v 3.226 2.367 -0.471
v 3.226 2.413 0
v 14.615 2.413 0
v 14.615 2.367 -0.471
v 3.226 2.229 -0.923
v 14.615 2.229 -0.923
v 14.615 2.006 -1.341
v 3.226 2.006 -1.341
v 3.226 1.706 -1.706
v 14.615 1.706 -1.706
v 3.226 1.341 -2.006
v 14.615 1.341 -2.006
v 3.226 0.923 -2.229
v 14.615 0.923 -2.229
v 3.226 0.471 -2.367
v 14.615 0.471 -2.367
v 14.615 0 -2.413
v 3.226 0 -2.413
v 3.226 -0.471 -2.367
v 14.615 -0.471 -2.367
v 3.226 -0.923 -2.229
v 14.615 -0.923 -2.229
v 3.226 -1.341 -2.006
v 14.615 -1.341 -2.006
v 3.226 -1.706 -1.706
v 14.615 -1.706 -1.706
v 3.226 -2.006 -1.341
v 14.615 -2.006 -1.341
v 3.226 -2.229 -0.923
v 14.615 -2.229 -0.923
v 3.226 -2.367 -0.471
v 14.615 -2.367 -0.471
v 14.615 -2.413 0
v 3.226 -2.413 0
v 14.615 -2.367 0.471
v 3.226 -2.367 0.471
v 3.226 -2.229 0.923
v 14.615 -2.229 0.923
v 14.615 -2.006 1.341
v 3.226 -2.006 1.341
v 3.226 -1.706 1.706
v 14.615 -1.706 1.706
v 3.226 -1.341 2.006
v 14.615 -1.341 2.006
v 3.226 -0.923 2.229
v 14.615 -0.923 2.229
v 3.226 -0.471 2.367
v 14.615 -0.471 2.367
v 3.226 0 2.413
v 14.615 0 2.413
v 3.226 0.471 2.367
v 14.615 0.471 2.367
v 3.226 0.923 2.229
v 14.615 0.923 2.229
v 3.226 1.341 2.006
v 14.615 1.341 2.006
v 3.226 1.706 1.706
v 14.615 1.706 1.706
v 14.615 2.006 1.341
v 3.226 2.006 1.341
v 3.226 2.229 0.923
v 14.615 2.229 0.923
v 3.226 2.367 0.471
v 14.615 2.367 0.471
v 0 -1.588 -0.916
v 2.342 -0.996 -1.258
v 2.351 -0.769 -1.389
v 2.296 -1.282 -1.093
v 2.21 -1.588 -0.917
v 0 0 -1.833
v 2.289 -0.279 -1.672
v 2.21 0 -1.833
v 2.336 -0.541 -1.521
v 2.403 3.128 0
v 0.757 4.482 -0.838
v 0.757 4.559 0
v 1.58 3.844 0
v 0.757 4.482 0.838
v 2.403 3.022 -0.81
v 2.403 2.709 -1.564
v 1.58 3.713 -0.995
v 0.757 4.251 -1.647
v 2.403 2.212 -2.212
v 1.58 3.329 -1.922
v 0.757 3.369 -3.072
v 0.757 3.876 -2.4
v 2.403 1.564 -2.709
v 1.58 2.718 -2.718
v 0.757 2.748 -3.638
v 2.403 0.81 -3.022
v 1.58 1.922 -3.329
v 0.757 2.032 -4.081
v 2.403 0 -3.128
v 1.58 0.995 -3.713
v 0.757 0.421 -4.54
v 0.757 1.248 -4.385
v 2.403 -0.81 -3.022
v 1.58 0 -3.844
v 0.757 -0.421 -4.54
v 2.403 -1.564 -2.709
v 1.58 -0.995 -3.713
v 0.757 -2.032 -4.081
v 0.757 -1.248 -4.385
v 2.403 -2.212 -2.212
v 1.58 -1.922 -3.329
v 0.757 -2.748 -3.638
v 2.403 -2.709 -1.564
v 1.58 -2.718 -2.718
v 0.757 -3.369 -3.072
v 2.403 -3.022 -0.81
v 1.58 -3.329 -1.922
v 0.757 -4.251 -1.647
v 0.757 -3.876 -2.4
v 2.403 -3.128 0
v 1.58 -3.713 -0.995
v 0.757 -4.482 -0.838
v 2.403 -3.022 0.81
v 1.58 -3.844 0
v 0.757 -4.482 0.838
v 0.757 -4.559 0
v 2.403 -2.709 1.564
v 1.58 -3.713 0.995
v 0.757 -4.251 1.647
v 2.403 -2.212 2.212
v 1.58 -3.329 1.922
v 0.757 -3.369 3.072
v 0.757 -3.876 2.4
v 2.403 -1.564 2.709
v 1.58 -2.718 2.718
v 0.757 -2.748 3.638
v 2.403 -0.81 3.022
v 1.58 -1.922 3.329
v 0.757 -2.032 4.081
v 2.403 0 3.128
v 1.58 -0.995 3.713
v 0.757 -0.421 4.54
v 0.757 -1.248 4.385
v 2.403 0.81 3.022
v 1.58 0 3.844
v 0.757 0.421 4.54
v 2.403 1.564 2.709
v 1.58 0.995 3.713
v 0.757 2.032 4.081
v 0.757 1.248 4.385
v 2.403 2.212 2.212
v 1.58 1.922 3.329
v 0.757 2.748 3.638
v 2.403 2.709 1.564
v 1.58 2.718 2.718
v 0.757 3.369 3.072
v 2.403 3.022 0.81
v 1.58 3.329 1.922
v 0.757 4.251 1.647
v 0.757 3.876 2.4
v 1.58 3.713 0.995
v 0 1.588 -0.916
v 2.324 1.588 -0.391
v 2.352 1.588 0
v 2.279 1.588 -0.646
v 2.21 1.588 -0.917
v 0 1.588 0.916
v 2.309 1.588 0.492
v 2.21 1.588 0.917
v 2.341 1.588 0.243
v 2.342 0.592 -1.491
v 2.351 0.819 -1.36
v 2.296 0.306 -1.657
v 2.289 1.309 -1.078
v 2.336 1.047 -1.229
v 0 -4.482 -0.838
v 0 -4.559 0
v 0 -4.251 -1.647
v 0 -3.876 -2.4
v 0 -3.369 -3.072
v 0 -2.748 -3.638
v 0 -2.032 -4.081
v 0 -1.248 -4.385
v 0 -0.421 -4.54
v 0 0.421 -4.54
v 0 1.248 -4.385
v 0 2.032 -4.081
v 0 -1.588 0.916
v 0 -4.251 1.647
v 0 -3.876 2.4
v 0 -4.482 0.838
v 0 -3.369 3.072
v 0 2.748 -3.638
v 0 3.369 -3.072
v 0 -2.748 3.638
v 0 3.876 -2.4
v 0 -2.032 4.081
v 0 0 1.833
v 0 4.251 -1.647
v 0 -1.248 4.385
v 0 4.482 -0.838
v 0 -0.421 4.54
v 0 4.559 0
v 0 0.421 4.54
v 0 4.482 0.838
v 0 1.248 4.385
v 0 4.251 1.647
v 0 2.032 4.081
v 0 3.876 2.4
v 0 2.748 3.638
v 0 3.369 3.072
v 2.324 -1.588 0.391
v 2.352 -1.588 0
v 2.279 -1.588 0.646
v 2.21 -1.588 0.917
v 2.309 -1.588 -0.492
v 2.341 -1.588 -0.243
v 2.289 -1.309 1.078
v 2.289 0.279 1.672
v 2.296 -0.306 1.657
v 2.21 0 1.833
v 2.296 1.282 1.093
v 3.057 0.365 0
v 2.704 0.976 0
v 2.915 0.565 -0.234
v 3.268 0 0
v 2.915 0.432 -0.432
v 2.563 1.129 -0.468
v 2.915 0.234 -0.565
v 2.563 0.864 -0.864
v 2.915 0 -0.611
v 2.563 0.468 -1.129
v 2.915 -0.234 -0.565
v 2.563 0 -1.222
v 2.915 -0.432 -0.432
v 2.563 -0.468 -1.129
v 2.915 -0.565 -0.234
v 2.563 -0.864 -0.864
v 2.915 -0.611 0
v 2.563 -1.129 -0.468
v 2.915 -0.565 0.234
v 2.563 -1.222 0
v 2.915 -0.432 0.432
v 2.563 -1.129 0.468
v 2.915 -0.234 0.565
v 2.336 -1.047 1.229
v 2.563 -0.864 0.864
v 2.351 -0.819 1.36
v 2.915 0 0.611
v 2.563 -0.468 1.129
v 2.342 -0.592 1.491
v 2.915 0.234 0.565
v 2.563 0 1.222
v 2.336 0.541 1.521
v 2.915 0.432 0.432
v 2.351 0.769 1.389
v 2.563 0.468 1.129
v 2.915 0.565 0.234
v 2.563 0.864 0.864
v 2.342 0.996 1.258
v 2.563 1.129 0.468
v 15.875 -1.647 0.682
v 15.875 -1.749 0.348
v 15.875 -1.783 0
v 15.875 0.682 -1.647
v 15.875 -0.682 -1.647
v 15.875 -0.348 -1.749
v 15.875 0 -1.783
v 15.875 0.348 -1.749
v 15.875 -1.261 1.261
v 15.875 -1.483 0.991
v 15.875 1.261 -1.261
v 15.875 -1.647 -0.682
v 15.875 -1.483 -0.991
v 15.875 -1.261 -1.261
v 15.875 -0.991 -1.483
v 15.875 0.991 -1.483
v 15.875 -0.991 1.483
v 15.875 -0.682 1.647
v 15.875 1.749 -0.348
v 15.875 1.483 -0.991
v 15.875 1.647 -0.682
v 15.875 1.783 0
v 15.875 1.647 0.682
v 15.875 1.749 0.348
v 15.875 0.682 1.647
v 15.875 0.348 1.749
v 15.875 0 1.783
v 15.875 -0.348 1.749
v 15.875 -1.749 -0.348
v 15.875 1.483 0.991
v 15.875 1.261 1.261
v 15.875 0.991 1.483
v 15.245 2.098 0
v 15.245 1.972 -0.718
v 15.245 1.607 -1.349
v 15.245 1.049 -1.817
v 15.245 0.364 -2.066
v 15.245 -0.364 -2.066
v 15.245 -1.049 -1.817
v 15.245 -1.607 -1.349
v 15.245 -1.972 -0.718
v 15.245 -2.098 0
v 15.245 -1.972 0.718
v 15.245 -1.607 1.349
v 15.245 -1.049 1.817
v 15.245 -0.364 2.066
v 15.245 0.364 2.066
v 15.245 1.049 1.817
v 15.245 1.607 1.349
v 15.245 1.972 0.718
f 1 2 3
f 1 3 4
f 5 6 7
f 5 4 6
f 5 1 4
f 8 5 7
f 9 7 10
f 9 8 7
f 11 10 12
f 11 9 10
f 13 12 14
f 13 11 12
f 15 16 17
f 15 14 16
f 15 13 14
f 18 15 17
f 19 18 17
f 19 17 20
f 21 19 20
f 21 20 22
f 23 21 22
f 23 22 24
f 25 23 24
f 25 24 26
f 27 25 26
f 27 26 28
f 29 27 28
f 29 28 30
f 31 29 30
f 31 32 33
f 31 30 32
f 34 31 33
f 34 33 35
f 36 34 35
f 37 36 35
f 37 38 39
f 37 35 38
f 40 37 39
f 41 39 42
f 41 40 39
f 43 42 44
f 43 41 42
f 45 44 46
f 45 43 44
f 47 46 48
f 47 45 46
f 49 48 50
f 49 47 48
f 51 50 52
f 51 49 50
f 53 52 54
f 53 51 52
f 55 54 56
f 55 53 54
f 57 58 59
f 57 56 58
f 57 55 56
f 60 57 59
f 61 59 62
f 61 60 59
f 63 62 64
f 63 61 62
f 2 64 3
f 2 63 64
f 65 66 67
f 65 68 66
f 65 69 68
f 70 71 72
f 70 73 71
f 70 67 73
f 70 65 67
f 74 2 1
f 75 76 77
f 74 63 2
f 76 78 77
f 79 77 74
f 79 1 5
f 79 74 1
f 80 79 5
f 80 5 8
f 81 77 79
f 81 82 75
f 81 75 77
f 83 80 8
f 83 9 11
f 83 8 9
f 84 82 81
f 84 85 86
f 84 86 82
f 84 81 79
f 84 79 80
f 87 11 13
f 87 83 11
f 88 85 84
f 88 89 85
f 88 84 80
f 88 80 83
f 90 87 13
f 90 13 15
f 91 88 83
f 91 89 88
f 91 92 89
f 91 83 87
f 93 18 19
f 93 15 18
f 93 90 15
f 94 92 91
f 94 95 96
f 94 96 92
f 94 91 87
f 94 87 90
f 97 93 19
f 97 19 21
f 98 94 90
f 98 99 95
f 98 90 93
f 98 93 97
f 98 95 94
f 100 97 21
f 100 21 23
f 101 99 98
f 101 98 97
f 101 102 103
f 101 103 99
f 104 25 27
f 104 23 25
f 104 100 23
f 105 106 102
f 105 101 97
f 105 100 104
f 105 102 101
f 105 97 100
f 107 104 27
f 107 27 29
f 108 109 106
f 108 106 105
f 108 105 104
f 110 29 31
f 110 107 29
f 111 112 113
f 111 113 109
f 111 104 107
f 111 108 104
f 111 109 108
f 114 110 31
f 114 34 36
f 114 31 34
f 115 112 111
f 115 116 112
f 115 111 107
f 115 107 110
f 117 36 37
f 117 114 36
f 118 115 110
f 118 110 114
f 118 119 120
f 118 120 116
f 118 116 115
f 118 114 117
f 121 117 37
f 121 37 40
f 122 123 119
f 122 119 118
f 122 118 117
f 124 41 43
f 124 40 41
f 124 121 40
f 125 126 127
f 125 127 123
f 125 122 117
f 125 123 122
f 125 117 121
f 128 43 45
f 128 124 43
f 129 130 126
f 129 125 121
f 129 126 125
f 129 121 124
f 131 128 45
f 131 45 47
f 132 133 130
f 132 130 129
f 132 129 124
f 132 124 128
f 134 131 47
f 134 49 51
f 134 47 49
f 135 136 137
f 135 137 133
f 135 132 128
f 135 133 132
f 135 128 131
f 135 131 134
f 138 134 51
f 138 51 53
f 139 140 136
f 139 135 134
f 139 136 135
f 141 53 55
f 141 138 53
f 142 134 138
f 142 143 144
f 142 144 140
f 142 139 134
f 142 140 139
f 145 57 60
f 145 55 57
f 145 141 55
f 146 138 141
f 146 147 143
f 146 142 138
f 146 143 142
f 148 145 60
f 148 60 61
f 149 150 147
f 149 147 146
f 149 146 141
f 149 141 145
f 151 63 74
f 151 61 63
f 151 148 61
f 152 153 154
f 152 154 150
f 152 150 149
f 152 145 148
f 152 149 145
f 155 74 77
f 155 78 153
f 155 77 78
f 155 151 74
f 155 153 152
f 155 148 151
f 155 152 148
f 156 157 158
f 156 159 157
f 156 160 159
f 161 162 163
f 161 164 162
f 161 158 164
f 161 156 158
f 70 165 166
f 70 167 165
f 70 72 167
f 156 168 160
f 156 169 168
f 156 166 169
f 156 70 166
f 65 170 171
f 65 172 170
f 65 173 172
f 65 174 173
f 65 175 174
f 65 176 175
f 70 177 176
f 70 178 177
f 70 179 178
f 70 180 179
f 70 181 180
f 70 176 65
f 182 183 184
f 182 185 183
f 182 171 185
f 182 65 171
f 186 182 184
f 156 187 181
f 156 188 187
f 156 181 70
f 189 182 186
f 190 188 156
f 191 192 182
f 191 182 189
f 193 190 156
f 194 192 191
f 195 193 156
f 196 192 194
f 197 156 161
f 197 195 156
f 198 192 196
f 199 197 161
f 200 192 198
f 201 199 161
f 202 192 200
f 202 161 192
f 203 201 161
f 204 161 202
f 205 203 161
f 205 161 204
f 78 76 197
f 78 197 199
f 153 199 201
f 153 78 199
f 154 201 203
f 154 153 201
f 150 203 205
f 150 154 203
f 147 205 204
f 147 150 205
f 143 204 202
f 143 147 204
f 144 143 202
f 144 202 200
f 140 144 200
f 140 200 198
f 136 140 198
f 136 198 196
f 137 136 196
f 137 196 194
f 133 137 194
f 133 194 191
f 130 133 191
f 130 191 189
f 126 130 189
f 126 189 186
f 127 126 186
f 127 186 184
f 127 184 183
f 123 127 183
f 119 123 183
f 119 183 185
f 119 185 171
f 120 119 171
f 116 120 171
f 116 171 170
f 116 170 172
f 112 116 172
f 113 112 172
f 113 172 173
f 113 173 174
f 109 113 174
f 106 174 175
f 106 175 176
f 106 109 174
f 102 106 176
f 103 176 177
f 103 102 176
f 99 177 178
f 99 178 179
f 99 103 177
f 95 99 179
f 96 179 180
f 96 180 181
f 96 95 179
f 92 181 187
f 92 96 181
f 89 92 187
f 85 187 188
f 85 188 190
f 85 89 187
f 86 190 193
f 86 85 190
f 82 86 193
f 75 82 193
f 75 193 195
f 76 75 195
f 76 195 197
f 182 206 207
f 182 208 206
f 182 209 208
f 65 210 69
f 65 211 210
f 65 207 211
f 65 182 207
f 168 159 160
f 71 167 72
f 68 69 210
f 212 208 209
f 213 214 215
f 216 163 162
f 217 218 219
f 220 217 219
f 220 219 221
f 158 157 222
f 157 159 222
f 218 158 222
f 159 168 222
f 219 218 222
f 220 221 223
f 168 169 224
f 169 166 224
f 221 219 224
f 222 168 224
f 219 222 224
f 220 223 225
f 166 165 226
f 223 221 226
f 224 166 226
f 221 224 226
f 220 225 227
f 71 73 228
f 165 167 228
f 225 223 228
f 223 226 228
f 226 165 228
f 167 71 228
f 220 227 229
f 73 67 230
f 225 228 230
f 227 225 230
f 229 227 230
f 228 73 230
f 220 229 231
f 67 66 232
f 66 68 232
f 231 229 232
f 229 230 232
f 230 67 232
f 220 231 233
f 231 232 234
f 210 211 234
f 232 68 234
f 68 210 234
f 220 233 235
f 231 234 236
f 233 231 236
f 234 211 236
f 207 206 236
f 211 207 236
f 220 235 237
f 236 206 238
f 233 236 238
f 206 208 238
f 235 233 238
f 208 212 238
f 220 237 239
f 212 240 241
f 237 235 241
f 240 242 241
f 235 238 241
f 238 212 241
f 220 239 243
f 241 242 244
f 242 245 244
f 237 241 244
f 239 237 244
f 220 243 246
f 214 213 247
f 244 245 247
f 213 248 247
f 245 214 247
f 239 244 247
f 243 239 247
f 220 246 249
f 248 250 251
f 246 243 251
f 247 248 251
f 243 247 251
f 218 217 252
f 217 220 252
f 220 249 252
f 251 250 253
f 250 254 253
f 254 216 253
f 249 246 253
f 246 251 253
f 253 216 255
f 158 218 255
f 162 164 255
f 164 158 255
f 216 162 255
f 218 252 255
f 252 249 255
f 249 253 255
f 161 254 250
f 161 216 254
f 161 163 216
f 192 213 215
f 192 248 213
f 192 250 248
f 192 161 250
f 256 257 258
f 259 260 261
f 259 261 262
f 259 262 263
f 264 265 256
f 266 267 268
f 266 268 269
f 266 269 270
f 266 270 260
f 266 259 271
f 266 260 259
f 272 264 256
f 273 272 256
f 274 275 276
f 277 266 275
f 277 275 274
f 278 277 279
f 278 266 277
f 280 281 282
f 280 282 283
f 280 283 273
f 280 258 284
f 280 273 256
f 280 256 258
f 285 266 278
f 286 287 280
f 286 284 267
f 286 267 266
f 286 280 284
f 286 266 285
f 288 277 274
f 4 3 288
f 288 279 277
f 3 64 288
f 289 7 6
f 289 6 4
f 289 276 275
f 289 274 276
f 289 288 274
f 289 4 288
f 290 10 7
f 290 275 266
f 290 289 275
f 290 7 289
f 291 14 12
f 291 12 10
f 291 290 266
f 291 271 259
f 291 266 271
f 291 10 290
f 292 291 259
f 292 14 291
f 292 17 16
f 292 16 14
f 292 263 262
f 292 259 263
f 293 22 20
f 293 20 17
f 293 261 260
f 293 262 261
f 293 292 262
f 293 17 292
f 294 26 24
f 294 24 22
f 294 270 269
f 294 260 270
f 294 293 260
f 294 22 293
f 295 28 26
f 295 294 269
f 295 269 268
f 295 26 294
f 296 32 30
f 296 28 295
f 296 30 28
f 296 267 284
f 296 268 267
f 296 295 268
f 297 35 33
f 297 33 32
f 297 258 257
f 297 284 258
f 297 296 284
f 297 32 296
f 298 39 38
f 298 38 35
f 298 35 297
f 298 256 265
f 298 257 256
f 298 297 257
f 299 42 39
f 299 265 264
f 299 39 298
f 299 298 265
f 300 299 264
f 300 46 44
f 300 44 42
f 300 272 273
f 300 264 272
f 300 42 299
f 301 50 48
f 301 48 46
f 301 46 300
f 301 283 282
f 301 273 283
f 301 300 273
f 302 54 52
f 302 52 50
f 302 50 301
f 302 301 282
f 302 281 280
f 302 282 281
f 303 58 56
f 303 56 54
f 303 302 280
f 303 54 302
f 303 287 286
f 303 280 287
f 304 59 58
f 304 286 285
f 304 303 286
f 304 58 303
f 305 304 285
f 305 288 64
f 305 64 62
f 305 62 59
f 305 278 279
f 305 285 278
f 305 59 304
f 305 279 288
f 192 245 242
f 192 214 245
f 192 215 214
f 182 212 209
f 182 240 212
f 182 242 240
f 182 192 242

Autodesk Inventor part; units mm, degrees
ref_plane "YZ Plane" through (0, 0, 0) normal (1, 0, 0) x (0, 1, 0)
ref_plane "XZ Plane" through (0, 0, 0) normal (0, 1, 0) x (-1, 0, 0)
sketch "Sketch1" plane through (0, 0, 0) normal (0, 0, 1) x (1, 0, 0)
  line L0 (15.875, 0) -> (15.875, 2.413)
  line L1 (15.875, 2.413) -> (5.8717, 2.413)
  line L2 (5.8717, 2.413) -> (3.2258, 2.413)
  line L3 (0, 4.5593) -> (0, 1.8331)
  line L4 (0, 1.8331) -> (2.2098, 1.8331)
  line L5 (2.2098, 1.8331) -> (3.2681, 0)
  line L6 (3.2681, 0) -> (15.875, 0)
  line L7 (0, 4.5593) -> (0.7568, 4.5593)
  line L8 (0.7568, 4.5593) -> (3.2258, 2.413)
  line L9 (3.2258, 2.413) -> (3.2258, 2.413)
  line L10 (5.8717, 2.413) -> (3.2258, 2.413) construction
  line L11 (3.2258, 2.413) -> (3.2258, 2.413)
  line L12 (-3.175, 0) -> (19.05, 0) projected
  line L13 (0, -0.9119) -> (0, 5.4712) projected
  dimension "d0" = 15.875
  dimension "d1" = 10.0033
  dimension "d2" = 2.2098
  dimension "d3" = 4.826
  dimension "d6" = 3.2258
  dimension "d7" = 41
  dimension "d8" = 3.6662
  dimension "d9" = 60
  dimension "d10" = 9.1186
  dimension "d11" = 4.826
  dimension "d12" = 2.6459
revolve "Body" add sketch "Sketch1" angle 360 about axis through (3.2681, 0, 0) along (1, 0, 0) contours L6 L5 L4 L3 L7 L8 L2 L1 L0
sketch "Sketch2" plane through (0, 0, 0) normal (-1, 0, 0) x (0, 0, 1)
  circle A0 centre (0, 0) radius 1.8331 projected
  line L0 (0, -6.383) -> (0, 6.383) projected
  line L1 (-6.383, 0) -> (6.383, 0) projected
  line L2 (1.8331, 0) -> (0.9165, -1.5875)
  line L3 (0.9165, -1.5875) -> (-0.9165, -1.5875)
  line L4 (-0.9165, -1.5875) -> (-1.8331, 0)
  line L5 (-1.8331, 0) -> (-0.9165, 1.5875)
  line L6 (-0.9165, 1.5875) -> (0.9165, 1.5875)
  line L7 (0.9165, 1.5875) -> (1.8331, 0)
  point P0 (0, 1.8331)
extrude "Slot" add sketch "Sketch2" against normal up to next contours L7 A0 | A0 L2 | L6 L0 A0 | A0 L0 L3 | L0 L6 A0 | A0 L3 L0 | L4 A0 | A0 L5
thread "Thread" size "10-24 UNC" class "2A" standard "ANSI Unified Screw Threads" length 10.0033
chamfer "Chamfer1" distance 0.6299 distance2 1.2598 1 edges at (15.875, -2.413, 0) measured on face at (15.875, -0.0132, -0.958)
ref_plane "Work Plane1" through (104.775, 0, 0) normal (0, 0, -1) x (1, 0, 0)
equation "\"d15\" = GEL"
equation "\"d17\" = -0.5 * SPD + 0.5 * GD"
equation "\"d18\" = GUL"
equation "\"d0\" = NLG"
equation "\"d1\" = GEL"
equation "\"d2\" = INTI"
equation "\"d3\" = GD"
equation "\"d6\" = KOH"
equation "\"d7\" = 0.5 * SEWI"
equation "\"d8\" = 1.1547 * SW"
equation "\"d10\" = KOD"
equation "\"d11\" = BDM"
equation "\"d12\" = GAL"
equation "\"NLG\" = 15.875"
equation "\"INTI\" = 2.2098"
equation "\"GEL\" = 10.00328"
equation "\"GAL\" = 2.64592"
equation "\"KOH\" = 3.2258"
equation "\"KOD\" = 9.1186"
equation "\"GUL\" = 1.25984"
equation "\"SPD\" = 3.56616"
equation "\"BDM\" = NND"
equation "\"GD\" = NND"
equation "\"SEWI\" = 82deg"
equation "\"SW\" = 3.175"
equation "\"TOA\" = 30deg"
equation "\"GD1\" = SPD"
equation "\"THREADDIA\" = 4.826"
equation "\"HHPTC\" = 1.05842"
equation "\"NND\" = 4.826"
equation "\"E0\" = 1.155 * SW"
properties part number "ANSI B18.3 - 10-24 UNC x 0.625" material "Steel, Mild"
